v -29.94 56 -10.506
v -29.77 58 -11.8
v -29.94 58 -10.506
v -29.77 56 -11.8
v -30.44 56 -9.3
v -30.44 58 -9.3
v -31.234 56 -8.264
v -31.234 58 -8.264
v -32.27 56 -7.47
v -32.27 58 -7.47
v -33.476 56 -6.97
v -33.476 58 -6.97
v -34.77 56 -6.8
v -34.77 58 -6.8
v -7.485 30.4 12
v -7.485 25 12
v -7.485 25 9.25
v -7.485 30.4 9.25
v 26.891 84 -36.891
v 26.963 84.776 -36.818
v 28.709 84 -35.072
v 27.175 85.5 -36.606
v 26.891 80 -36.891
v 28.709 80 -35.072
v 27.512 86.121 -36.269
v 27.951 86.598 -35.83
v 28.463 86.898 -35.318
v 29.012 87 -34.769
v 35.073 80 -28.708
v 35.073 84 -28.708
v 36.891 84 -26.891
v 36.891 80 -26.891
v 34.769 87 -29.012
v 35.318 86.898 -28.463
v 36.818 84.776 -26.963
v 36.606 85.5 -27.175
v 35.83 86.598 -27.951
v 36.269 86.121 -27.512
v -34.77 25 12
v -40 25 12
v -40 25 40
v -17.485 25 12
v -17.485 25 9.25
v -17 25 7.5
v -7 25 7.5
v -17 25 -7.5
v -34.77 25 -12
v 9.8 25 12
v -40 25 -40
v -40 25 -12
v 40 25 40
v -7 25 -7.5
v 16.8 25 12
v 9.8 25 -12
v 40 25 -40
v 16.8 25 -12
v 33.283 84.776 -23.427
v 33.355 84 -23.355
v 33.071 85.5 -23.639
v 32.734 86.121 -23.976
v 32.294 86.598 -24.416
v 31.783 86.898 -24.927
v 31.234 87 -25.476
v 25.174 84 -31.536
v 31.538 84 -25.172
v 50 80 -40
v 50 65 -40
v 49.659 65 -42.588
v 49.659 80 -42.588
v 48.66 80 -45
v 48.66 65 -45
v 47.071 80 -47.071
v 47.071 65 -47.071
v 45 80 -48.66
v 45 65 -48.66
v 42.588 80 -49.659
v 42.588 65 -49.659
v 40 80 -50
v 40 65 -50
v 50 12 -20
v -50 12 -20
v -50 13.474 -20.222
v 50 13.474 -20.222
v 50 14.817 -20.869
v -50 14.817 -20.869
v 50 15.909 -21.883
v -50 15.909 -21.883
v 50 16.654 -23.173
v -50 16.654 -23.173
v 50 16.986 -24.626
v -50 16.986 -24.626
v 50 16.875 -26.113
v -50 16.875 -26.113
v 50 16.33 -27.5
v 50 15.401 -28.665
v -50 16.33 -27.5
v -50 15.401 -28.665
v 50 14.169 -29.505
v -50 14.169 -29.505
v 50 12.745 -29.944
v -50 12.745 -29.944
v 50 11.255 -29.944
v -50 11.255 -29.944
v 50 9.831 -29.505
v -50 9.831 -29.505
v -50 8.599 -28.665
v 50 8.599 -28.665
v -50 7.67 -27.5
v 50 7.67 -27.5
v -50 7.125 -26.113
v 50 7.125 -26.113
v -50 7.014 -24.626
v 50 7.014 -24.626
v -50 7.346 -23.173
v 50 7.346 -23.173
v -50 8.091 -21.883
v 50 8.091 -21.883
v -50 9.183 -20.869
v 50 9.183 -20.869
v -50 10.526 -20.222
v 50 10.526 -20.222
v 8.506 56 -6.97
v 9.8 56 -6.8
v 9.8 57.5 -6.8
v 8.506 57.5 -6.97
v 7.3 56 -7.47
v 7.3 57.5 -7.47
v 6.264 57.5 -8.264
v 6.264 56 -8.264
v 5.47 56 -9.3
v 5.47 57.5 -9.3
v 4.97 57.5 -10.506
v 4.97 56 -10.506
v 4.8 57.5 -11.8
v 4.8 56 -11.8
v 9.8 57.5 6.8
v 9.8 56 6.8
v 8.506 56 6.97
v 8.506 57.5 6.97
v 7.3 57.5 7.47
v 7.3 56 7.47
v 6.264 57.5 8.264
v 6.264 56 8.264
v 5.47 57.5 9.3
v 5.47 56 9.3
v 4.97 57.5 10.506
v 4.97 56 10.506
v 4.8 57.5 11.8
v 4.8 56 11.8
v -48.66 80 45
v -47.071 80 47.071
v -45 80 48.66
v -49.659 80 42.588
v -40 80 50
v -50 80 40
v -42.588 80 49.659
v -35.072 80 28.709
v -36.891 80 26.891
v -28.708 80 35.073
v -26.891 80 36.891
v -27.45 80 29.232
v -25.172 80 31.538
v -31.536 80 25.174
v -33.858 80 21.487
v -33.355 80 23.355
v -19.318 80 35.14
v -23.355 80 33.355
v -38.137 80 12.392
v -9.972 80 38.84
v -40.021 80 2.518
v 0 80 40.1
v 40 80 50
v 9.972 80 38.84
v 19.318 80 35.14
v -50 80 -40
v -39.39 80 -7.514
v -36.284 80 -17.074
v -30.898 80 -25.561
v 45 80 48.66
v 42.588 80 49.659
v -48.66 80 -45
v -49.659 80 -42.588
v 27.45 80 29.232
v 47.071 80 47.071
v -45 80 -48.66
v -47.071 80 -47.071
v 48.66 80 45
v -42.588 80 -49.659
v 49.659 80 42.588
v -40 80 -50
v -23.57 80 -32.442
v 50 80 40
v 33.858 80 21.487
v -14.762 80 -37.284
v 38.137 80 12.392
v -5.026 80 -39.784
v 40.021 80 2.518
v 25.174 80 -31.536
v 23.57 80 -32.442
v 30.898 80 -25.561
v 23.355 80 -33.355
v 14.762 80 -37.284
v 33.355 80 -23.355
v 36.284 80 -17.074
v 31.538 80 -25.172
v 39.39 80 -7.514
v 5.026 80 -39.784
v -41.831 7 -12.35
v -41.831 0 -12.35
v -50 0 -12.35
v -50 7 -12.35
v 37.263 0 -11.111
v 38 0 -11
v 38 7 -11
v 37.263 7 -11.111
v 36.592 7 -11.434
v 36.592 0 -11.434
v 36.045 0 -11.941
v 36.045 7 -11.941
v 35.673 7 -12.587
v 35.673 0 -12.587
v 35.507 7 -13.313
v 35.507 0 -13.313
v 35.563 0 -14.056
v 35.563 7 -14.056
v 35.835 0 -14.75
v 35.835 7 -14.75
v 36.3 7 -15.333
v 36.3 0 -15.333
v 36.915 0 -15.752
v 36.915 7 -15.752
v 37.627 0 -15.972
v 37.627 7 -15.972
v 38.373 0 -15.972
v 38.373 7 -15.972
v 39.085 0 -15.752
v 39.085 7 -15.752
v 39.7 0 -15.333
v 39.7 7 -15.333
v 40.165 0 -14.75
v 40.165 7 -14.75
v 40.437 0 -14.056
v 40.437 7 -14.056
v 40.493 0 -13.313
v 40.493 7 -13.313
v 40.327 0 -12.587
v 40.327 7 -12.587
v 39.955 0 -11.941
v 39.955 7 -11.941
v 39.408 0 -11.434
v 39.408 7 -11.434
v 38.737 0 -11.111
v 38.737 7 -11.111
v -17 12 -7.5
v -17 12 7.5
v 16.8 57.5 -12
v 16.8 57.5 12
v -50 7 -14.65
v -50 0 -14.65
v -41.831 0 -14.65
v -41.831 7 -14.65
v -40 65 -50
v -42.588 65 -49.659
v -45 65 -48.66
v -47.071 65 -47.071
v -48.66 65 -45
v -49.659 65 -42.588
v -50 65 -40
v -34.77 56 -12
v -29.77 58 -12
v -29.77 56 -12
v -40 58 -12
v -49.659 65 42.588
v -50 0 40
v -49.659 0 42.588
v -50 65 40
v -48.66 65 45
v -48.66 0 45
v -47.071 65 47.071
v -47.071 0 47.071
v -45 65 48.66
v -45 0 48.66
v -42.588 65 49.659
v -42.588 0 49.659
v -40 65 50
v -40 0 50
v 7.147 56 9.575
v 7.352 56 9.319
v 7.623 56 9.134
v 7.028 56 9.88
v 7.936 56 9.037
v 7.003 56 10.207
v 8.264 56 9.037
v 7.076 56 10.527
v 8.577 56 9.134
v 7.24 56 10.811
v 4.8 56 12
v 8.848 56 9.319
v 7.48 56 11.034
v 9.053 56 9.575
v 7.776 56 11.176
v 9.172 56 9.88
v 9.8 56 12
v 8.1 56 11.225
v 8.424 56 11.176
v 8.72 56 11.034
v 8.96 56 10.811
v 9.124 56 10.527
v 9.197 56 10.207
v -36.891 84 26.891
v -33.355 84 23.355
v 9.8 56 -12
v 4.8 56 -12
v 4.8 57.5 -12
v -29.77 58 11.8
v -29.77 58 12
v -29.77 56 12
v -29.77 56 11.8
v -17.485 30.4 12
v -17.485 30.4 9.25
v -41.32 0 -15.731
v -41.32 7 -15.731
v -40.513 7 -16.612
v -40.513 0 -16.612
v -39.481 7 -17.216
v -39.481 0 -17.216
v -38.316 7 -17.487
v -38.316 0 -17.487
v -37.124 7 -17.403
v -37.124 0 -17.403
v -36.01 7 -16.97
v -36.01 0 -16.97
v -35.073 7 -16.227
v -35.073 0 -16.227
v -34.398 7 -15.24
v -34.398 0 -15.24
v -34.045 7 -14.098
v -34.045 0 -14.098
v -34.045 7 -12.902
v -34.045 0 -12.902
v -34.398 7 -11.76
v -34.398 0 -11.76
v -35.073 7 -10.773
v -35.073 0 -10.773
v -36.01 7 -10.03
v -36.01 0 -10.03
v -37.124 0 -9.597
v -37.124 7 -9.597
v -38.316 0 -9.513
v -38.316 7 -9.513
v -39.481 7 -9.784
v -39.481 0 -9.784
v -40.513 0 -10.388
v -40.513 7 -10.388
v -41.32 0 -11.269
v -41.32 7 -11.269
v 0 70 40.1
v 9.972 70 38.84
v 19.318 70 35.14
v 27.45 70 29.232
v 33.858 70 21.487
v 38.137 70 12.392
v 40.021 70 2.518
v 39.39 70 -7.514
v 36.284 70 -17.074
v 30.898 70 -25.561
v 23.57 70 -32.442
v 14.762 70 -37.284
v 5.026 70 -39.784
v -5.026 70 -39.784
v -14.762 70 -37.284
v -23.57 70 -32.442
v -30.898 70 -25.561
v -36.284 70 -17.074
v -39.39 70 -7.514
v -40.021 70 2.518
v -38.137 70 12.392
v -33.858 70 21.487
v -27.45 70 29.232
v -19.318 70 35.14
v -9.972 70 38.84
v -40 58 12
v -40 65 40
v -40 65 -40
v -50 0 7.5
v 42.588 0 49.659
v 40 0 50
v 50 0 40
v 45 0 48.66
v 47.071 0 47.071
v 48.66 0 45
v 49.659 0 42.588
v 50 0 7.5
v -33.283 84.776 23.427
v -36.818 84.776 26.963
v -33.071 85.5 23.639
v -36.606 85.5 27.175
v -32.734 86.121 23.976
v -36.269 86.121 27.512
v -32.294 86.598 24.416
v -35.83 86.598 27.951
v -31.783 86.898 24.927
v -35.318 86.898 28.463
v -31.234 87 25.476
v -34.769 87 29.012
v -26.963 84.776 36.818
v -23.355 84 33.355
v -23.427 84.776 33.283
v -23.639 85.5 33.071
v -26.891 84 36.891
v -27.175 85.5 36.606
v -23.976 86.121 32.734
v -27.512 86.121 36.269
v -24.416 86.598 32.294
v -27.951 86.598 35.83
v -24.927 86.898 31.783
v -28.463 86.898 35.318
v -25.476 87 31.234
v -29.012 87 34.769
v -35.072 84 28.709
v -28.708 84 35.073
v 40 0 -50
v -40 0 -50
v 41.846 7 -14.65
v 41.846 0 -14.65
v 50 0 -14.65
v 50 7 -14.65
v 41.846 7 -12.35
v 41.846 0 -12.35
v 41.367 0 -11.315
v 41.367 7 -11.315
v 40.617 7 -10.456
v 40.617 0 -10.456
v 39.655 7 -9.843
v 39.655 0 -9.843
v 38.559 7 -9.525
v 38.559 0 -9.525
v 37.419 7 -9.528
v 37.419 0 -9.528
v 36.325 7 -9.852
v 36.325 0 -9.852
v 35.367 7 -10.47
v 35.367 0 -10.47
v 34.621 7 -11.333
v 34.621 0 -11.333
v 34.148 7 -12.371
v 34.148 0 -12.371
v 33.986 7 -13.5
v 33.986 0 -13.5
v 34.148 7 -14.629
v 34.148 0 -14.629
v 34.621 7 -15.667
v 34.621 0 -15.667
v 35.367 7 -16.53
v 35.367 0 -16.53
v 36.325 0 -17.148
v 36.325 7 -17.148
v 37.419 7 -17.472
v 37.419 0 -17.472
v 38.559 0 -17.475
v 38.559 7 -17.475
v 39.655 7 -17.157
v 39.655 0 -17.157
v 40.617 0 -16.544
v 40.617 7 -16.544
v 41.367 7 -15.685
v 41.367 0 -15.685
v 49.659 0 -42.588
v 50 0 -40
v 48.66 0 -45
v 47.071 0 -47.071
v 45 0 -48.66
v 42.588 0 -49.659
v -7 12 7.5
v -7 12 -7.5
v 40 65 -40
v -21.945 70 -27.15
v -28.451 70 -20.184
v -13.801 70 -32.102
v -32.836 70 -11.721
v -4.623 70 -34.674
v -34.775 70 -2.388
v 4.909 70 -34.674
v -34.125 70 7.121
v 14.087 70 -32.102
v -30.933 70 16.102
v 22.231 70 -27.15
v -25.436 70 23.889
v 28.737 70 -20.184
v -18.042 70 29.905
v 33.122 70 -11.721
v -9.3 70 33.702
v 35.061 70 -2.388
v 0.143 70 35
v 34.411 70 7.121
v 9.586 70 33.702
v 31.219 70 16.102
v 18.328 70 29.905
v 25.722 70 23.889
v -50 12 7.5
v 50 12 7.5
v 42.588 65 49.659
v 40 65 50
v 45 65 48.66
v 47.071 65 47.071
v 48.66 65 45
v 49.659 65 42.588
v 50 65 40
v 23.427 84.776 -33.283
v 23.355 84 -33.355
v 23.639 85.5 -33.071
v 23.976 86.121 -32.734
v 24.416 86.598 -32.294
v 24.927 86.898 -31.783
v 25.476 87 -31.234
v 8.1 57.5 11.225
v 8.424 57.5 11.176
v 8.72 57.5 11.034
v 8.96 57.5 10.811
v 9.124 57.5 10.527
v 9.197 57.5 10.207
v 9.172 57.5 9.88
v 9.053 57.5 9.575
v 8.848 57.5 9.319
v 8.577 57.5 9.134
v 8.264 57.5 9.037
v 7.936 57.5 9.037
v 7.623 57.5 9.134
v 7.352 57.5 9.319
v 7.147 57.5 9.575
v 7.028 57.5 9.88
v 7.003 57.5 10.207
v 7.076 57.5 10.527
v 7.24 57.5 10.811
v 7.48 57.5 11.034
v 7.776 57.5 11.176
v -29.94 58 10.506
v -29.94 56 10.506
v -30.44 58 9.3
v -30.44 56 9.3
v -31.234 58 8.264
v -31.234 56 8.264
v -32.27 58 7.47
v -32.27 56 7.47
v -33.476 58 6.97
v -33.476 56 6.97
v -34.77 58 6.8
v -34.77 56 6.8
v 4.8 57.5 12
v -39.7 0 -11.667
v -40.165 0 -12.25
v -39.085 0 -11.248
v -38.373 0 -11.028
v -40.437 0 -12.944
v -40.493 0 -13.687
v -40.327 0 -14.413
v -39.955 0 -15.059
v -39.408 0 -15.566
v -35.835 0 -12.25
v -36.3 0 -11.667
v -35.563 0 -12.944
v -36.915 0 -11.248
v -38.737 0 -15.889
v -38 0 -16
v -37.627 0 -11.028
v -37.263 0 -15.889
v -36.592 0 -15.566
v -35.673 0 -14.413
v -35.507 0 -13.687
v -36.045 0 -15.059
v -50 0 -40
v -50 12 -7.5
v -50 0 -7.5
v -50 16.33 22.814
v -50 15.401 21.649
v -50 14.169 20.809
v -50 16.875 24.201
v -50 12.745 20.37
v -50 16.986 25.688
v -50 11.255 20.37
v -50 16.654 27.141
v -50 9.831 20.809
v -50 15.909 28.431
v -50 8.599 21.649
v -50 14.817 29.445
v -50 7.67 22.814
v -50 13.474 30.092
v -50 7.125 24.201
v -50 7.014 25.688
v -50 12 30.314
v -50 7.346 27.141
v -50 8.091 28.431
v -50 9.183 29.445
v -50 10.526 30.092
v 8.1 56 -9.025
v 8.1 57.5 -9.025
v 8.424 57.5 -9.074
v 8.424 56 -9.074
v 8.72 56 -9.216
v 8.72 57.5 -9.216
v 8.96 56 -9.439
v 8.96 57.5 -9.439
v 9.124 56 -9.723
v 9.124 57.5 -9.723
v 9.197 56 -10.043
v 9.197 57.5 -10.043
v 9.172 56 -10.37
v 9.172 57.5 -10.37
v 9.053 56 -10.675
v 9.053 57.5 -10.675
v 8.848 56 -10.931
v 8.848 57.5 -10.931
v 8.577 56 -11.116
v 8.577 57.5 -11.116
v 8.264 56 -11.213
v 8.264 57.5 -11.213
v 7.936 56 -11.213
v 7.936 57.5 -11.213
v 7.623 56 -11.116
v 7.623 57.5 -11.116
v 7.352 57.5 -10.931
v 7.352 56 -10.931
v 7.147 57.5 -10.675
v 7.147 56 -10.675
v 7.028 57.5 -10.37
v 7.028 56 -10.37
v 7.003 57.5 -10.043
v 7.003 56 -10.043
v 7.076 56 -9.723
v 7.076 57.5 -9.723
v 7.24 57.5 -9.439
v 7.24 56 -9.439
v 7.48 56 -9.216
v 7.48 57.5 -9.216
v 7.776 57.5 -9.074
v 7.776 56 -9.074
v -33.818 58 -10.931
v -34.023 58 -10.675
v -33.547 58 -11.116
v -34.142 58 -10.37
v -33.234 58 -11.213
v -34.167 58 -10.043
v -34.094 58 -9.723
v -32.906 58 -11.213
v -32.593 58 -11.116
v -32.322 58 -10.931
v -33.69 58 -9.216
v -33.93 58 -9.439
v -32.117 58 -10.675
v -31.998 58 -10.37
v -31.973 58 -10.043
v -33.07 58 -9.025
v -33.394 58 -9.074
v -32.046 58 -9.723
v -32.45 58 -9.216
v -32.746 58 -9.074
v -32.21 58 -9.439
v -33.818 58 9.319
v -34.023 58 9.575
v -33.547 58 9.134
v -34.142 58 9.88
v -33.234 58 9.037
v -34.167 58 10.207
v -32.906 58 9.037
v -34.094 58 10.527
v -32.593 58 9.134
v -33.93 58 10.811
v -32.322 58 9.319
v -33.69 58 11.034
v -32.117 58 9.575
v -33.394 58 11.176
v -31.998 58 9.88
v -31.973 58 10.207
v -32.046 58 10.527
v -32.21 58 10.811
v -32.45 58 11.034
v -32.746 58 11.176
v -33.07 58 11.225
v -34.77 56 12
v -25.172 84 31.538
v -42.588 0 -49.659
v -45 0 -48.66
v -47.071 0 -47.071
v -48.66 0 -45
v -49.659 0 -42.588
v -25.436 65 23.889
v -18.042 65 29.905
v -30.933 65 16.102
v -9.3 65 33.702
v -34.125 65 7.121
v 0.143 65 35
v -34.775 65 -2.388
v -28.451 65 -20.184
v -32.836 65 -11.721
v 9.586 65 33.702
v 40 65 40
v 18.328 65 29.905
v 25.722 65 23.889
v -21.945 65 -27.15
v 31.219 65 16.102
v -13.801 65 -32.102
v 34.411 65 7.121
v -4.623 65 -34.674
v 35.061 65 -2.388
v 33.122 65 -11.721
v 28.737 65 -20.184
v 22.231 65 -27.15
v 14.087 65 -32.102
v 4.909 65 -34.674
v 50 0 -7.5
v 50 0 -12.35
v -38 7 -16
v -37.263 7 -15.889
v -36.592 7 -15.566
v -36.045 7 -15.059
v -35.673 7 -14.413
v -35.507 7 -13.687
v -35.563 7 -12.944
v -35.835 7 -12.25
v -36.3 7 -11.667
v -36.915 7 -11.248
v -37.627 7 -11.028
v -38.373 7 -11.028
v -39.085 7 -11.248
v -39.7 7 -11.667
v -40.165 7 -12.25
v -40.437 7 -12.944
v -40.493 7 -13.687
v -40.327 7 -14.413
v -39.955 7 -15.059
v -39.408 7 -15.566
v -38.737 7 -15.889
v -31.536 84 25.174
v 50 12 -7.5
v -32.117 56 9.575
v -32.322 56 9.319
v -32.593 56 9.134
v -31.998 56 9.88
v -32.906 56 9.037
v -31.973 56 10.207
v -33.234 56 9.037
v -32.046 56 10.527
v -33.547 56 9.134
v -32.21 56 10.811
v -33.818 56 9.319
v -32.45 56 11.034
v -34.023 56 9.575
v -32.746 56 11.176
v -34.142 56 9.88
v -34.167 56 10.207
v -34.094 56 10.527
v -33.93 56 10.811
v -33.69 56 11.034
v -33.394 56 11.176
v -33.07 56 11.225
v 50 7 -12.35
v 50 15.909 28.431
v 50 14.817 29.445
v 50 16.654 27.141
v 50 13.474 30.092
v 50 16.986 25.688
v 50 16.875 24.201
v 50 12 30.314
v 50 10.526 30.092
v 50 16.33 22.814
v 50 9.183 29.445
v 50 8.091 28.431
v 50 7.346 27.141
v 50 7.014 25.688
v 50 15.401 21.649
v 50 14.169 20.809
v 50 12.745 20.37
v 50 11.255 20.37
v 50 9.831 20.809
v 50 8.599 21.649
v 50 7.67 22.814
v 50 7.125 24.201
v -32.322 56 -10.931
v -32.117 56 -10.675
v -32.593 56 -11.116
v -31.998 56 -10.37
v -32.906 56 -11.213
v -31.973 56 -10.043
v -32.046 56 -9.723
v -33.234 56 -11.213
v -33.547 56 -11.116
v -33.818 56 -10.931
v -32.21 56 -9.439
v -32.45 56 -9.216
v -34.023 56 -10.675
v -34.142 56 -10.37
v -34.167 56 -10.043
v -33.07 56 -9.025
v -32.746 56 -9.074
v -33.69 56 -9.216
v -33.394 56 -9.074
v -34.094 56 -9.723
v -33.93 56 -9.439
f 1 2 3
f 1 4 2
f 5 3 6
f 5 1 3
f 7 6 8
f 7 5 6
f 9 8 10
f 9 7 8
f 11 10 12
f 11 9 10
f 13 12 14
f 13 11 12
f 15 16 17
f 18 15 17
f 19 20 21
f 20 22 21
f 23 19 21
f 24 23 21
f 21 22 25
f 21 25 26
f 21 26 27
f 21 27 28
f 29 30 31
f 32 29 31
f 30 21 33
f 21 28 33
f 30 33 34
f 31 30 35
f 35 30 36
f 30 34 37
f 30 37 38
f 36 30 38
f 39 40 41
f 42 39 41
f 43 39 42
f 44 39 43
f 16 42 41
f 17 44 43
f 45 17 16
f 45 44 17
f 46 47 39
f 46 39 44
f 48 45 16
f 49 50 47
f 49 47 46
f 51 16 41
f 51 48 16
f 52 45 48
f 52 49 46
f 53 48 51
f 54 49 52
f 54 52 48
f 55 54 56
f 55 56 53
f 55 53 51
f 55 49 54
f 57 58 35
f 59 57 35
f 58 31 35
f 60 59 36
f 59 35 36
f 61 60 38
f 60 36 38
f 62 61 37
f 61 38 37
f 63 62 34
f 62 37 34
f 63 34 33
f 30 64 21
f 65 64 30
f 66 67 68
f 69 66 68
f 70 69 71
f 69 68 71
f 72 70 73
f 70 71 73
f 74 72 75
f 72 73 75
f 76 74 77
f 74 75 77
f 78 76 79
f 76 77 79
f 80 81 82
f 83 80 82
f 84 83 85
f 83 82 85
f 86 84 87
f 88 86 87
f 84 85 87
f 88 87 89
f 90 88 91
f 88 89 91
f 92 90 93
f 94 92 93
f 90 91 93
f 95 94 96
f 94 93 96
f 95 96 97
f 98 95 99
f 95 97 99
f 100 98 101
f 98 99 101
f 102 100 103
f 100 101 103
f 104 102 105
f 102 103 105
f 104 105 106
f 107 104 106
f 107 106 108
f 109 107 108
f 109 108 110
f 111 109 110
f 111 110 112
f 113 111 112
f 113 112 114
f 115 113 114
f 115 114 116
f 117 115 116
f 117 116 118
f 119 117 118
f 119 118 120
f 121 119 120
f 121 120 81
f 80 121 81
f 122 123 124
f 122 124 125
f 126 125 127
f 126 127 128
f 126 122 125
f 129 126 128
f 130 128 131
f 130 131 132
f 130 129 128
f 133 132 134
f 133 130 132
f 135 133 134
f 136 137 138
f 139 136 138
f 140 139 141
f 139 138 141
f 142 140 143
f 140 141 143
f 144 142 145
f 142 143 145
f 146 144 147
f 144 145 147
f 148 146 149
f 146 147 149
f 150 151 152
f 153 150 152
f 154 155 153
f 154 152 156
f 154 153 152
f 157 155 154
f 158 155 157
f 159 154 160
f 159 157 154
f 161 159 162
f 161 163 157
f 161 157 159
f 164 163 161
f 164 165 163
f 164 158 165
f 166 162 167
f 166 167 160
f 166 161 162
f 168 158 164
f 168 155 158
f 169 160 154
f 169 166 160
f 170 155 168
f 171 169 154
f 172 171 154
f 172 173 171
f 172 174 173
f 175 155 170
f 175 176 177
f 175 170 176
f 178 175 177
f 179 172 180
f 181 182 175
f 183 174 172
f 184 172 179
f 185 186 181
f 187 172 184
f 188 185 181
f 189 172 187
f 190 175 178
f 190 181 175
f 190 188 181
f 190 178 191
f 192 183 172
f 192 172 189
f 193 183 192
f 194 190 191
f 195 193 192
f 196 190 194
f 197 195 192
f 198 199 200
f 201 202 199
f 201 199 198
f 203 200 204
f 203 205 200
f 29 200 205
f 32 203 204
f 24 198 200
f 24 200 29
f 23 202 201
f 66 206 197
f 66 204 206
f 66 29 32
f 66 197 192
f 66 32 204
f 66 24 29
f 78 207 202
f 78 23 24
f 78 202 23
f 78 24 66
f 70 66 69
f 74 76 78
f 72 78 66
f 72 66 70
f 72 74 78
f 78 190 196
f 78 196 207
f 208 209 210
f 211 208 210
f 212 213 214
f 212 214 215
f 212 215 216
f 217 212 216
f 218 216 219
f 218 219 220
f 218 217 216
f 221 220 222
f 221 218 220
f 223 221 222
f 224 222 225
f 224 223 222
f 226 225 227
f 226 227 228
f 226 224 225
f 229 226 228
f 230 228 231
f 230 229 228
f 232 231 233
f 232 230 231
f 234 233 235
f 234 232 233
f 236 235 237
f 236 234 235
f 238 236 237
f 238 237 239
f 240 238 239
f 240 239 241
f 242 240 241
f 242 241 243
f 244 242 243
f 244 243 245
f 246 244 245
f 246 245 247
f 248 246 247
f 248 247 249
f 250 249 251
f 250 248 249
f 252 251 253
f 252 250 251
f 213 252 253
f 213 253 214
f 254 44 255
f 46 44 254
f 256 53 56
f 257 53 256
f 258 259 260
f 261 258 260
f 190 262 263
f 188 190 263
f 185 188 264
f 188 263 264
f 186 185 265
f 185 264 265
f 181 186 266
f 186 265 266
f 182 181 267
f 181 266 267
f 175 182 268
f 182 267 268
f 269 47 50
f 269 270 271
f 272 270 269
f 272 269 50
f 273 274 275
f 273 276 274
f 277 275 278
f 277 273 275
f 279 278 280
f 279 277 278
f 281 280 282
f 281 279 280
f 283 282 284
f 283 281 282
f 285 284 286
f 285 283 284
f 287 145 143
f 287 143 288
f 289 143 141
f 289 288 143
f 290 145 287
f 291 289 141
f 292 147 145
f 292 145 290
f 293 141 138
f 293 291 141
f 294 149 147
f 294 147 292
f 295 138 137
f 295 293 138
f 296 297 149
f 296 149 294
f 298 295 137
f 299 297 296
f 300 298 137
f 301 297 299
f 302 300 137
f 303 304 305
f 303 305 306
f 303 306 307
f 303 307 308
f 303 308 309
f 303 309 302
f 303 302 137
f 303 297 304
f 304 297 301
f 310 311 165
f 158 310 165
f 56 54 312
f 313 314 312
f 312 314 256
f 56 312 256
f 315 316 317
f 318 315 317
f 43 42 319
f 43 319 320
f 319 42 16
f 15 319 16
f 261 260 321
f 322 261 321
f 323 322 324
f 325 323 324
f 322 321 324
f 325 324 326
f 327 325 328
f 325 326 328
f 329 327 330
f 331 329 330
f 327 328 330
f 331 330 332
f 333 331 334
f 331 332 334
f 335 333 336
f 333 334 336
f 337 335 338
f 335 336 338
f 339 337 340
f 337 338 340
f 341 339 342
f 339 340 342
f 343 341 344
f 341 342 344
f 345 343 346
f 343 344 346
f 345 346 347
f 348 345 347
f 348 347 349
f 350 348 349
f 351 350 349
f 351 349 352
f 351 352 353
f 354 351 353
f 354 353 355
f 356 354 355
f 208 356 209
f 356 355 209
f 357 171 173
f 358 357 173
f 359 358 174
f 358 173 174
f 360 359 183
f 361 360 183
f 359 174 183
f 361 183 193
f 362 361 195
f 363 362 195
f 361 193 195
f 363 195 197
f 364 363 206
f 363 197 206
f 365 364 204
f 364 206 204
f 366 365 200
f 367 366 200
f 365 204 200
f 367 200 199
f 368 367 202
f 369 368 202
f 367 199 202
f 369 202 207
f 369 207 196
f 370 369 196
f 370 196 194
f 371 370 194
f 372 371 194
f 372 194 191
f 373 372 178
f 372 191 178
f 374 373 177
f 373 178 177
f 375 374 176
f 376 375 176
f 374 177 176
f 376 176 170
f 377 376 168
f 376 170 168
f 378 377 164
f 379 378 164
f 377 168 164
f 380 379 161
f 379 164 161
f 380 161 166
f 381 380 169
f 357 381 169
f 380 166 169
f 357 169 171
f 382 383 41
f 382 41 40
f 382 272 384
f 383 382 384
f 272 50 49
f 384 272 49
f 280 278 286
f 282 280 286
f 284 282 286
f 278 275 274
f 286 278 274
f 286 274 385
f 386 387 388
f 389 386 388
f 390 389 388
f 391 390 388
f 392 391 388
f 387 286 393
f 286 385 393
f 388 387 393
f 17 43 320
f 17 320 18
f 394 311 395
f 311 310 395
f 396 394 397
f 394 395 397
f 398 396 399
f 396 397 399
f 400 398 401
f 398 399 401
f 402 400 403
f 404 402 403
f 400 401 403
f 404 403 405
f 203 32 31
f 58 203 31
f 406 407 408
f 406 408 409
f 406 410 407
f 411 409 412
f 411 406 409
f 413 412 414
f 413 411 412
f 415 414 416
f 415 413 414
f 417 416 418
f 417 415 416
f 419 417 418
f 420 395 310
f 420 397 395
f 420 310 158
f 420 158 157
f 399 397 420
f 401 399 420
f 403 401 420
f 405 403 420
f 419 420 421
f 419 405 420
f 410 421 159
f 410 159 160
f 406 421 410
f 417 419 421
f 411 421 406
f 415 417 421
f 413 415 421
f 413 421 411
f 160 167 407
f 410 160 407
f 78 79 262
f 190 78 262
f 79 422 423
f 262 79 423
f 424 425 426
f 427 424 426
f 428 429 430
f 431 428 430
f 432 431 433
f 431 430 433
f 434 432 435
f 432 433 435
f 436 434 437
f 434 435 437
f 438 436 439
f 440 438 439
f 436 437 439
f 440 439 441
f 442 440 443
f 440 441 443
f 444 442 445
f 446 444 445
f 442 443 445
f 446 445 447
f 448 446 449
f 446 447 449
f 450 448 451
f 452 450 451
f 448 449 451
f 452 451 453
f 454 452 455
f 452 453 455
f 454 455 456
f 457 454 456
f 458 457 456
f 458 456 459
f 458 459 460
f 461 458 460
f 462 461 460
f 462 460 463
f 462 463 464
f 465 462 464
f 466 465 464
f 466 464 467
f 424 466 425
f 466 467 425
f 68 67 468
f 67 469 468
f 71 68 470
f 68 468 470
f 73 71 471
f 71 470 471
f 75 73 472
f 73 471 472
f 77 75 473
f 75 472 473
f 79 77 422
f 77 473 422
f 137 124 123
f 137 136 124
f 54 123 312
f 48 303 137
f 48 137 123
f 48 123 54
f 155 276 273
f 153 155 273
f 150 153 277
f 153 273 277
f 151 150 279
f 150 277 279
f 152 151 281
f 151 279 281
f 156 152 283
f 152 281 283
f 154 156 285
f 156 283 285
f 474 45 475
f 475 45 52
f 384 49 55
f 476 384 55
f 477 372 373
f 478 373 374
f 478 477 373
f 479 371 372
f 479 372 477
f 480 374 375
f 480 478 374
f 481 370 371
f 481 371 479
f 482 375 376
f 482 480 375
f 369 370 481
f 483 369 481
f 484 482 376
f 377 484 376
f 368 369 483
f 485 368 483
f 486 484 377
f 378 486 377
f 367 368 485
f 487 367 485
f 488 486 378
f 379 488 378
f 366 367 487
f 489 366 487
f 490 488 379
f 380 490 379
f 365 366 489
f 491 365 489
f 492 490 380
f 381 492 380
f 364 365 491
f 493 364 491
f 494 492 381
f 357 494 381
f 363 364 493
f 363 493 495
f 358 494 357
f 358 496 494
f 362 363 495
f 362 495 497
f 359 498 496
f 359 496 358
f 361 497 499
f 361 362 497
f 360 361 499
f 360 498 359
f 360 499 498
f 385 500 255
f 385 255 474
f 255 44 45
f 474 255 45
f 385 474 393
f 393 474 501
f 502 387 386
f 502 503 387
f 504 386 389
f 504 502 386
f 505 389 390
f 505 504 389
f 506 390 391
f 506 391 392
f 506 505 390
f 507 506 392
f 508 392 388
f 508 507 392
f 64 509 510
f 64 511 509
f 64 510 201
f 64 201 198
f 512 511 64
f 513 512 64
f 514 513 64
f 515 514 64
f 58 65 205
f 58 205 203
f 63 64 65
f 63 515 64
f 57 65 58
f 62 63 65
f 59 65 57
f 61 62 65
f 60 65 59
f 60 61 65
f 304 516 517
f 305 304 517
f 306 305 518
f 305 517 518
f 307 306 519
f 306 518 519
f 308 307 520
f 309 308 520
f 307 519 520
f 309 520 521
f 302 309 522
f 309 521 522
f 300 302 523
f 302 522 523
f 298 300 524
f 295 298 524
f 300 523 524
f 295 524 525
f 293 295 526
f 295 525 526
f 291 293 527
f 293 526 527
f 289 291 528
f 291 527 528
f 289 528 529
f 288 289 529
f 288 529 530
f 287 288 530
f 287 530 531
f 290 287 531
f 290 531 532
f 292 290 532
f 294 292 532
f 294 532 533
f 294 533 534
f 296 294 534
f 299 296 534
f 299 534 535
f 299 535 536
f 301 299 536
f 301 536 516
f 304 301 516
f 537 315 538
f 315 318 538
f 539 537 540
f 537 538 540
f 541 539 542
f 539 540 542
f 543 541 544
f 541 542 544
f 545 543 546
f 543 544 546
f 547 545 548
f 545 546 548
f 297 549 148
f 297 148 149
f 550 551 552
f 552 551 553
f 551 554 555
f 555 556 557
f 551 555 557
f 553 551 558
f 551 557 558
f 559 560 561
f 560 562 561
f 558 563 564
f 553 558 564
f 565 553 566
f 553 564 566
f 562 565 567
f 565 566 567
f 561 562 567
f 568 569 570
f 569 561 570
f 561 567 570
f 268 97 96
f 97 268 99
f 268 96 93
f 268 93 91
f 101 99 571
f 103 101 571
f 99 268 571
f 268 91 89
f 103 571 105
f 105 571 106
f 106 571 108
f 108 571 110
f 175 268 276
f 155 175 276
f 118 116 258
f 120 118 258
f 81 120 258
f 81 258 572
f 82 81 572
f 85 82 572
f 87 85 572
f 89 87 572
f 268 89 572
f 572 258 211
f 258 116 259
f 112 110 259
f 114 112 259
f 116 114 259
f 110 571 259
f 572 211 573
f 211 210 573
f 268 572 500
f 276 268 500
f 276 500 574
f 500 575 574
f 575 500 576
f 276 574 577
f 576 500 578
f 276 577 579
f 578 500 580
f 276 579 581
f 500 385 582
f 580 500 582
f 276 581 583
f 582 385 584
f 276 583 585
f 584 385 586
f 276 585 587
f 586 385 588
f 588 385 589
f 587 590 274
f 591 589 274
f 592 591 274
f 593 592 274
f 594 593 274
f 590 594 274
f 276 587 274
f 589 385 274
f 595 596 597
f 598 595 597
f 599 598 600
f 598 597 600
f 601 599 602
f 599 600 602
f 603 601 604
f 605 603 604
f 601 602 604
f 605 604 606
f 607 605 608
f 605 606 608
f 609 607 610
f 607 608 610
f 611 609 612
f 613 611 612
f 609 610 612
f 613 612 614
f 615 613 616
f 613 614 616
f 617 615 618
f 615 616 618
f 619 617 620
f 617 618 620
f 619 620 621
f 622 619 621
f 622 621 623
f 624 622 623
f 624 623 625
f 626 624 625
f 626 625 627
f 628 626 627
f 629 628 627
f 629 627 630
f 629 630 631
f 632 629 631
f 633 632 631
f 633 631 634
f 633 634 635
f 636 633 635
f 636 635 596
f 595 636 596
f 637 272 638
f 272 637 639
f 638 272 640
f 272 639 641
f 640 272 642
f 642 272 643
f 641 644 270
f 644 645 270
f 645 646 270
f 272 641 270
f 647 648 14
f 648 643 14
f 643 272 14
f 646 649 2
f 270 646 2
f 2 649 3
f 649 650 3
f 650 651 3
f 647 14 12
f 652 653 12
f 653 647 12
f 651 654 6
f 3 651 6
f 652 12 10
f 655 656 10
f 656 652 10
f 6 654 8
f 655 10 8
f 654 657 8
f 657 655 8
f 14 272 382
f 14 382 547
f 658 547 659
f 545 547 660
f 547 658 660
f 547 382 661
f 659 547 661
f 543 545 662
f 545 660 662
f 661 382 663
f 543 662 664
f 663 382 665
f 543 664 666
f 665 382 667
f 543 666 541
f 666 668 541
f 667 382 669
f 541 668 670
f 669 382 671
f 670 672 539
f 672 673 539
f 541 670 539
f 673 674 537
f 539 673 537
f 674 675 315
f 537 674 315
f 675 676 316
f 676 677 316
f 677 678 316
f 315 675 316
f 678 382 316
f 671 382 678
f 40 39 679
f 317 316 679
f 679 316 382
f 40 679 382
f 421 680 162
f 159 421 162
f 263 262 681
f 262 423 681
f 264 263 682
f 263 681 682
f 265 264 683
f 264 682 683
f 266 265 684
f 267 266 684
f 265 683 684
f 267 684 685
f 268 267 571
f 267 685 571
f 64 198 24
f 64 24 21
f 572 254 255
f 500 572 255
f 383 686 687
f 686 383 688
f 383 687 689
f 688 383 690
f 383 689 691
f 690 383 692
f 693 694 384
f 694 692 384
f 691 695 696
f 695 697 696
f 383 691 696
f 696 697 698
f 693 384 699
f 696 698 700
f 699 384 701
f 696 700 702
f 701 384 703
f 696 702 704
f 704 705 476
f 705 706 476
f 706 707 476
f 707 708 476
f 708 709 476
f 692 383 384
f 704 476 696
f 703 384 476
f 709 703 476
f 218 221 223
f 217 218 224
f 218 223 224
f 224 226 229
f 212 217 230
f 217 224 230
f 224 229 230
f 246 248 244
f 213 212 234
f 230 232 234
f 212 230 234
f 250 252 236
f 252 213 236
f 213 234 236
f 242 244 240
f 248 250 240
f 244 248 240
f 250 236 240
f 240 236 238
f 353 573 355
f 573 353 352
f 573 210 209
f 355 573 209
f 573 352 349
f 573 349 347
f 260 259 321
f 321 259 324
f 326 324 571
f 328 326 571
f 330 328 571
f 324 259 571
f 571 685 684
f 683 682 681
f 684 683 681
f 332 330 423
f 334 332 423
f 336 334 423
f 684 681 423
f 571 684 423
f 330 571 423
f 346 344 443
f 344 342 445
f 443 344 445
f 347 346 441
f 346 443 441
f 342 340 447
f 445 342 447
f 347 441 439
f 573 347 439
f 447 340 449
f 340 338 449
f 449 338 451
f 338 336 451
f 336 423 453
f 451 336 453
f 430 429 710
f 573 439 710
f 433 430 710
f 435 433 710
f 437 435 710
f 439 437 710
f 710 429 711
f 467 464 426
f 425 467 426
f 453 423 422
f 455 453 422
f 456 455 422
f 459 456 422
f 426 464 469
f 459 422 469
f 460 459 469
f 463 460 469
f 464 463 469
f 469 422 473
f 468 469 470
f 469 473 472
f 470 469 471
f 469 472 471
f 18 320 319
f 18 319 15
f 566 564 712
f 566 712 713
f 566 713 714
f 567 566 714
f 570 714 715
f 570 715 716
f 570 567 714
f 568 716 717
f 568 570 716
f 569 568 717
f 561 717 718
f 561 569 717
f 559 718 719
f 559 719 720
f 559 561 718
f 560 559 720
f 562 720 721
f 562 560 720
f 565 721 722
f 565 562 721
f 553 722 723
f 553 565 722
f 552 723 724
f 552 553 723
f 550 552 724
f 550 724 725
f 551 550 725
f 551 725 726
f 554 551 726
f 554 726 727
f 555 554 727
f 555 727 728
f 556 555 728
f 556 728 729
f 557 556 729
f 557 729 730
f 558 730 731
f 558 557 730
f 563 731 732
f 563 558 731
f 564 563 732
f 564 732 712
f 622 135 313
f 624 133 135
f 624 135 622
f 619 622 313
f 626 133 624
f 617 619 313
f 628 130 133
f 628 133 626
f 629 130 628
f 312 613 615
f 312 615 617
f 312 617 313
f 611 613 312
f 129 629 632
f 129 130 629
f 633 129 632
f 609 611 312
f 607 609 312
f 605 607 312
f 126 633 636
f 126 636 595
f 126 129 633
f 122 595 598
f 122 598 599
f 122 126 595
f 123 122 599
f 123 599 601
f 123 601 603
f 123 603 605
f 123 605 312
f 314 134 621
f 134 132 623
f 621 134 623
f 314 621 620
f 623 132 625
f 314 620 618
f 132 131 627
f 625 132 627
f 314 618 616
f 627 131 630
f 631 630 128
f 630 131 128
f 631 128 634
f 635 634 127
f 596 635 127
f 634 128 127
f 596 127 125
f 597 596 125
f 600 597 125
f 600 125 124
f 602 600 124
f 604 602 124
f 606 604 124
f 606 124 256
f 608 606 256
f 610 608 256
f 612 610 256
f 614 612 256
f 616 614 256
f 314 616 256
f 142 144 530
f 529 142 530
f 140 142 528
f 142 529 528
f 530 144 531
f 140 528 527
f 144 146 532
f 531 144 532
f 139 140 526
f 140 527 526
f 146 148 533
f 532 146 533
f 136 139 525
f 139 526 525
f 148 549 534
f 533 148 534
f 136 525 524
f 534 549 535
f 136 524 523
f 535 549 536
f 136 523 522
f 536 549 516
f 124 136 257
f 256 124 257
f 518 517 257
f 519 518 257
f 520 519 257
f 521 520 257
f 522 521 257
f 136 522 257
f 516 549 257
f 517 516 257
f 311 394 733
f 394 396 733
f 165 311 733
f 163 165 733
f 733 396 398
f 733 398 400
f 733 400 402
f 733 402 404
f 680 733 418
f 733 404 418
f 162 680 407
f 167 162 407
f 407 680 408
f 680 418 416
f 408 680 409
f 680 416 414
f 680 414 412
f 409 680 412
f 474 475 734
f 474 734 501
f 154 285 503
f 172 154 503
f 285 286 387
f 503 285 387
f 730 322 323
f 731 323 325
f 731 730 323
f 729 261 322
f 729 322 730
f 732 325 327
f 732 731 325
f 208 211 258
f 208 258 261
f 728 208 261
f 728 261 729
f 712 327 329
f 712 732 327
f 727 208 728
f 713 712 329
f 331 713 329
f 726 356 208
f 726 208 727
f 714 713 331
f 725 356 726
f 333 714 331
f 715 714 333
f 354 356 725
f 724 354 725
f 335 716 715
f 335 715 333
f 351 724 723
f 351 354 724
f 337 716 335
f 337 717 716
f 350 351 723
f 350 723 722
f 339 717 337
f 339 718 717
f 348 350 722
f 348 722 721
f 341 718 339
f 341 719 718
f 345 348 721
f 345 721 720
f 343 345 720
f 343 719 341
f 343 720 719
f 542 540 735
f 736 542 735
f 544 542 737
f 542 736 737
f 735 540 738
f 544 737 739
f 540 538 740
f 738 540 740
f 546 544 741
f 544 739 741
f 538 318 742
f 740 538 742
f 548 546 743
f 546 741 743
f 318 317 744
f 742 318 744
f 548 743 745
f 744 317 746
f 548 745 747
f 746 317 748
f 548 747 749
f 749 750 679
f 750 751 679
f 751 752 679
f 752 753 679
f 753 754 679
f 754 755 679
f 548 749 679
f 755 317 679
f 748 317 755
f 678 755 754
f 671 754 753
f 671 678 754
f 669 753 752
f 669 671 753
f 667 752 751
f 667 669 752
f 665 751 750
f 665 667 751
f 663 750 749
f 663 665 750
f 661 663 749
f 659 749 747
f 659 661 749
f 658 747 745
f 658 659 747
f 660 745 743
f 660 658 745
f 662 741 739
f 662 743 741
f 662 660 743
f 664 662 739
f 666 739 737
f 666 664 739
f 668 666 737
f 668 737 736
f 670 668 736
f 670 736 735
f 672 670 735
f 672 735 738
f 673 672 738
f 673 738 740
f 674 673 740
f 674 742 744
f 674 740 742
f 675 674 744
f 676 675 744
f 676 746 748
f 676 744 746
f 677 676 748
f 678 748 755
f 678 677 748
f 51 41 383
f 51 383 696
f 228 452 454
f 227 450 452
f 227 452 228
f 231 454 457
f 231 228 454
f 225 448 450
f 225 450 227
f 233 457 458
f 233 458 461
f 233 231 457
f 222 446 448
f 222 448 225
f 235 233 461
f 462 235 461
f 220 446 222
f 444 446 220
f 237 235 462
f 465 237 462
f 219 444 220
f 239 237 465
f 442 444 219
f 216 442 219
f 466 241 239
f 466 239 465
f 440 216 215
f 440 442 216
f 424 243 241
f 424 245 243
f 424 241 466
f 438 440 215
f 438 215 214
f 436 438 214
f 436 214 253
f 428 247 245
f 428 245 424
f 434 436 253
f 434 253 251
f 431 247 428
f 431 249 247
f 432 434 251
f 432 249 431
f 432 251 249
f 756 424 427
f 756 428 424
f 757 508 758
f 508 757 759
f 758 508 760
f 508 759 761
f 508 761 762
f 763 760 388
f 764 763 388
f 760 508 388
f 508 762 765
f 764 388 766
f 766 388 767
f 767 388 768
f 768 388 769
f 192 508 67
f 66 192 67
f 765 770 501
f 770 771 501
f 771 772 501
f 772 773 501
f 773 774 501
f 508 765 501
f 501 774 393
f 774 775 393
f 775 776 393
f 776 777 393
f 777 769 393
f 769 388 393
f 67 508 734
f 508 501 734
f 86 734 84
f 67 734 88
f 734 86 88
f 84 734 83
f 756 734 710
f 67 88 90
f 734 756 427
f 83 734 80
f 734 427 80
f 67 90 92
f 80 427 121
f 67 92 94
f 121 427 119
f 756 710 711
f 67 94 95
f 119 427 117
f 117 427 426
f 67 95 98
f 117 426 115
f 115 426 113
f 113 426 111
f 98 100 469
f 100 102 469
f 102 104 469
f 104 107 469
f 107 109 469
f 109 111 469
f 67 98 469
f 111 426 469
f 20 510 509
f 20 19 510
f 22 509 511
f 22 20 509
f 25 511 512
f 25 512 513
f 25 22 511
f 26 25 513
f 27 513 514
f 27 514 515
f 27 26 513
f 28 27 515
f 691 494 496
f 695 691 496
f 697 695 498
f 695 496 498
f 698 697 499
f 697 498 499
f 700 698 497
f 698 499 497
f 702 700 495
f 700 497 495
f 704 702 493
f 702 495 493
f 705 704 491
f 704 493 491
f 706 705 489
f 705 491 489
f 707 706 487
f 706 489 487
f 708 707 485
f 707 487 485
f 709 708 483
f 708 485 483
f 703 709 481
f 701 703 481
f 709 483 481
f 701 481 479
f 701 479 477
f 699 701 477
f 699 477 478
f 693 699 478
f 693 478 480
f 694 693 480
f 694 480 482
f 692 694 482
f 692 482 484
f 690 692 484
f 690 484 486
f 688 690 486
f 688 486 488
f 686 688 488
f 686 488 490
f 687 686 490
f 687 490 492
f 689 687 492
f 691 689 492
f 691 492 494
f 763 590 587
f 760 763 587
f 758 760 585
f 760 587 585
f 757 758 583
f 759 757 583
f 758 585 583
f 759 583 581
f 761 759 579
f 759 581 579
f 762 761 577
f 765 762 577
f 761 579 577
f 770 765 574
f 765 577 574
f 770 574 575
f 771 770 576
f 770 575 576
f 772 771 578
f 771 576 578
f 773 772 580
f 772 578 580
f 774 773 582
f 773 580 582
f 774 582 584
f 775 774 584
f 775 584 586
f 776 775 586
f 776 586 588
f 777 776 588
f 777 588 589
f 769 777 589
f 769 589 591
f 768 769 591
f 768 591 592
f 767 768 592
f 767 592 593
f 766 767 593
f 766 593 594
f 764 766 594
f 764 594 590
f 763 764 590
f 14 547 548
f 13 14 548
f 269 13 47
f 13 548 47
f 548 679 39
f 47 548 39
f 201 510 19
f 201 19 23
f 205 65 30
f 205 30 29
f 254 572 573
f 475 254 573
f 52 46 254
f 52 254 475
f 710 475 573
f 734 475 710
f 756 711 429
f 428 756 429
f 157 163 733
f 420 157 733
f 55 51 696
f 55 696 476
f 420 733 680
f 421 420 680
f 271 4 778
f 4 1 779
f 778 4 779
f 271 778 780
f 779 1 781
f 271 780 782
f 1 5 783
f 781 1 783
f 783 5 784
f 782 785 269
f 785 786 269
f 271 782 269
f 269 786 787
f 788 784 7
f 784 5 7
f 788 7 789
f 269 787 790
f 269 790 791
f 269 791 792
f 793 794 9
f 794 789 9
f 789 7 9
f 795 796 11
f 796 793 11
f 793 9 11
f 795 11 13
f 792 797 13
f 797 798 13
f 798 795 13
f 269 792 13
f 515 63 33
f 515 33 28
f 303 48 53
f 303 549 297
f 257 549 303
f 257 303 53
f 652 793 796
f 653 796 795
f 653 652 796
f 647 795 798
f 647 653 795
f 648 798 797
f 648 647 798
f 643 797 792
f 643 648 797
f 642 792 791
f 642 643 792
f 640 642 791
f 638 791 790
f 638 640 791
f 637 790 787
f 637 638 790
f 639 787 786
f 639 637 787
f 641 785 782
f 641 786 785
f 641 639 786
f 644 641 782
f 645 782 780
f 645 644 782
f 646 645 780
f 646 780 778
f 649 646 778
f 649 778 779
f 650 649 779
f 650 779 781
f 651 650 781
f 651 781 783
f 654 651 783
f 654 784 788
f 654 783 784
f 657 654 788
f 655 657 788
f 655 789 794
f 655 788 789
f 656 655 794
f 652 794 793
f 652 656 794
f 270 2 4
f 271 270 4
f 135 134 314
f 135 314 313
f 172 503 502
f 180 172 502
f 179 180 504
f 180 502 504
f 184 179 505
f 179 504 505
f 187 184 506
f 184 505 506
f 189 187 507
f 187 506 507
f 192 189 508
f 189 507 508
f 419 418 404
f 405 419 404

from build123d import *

# Parameters (mm, degrees)
SKETCH1_W            = 100
SKETCH1_H            = 100
BOSS_EXTRUDE1_DEPTH  = 25
SKETCH2_W            = 100
SKETCH2_H            = 100
SKETCH2_W_2          = 80
SKETCH2_H_2          = 80
BOSS_EXTRUDE2_DEPTH  = 40
SKETCH3_R            = 5
SKETCH3_W            = 15
SKETCH3_H            = 12
CUT_EXTRUDE1_DEPTH   = 130.325171564
FILLET2_R            = 10
FILLET3_R            = 10
FILLET4_R            = 10
FILLET5_R            = 10
BOSS_EXTRUDE3_DEPTH  = 15
SKETCH6_R            = 35
CUT_EXTRUDE3_DEPTH   = 25
SKETCH7_R            = 40.1
CUT_EXTRUDE4_DEPTH   = 10
BOSS_EXTRUDE4_DEPTH  = 12
SKETCH10_R           = 1.1
SKETCH10_W           = 5
SKETCH10_H           = 13.6
CUT_EXTRUDE5_DEPTH   = 10
FILLET6_R            = 5
SKETCH11_W           = 12
SKETCH11_H           = 0.5
CUT_EXTRUDE6_DEPTH   = 24
SKETCH12_W           = 10
SKETCH12_H           = 15
CUT_EXTRUDE7_DEPTH   = 24
SKETCH15_W           = 10
SKETCH15_H           = 2.75
BOSS_EXTRUDE5_DEPTH  = 5.4
SKETCH18_R           = 2.5
CUT_EXTRUDE8_DEPTH   = 7
BOSS_EXTRUDE6_DEPTH  = 5
FILLET8_R            = 3
FILLET8_OF_MIRROR3_R = 3


with BuildPart() as part:
    # Sketch1 → Boss-Extrude1 (new body)
    with BuildSketch(Plane(origin=(0, 0, 0), x_dir=(1, 0, 0), z_dir=(0, 1, 0))):
        Rectangle(SKETCH1_W, SKETCH1_H)
    extrude(amount=BOSS_EXTRUDE1_DEPTH)

    # Sketch2 → Boss-Extrude2 (add)
    with BuildSketch(Plane(origin=(0, 25, 0), x_dir=(1, 0, 0), z_dir=(0, 1, 0))):
        Rectangle(SKETCH2_W, SKETCH2_H)
        Rectangle(SKETCH2_W_2, SKETCH2_H_2, mode=Mode.SUBTRACT)
    extrude(amount=BOSS_EXTRUDE2_DEPTH)

    # Sketch3 → Cut-Extrude1 (cut, through all)
    with BuildSketch(Plane.ZY.offset(50)):
        with Locations((-25, 12)):
            Circle(SKETCH3_R)
        with Locations((25.313920598, 12)):
            Circle(SKETCH3_R)
        with Locations((0, 6)):
            Rectangle(SKETCH3_W, SKETCH3_H)
    extrude(amount=-CUT_EXTRUDE1_DEPTH, mode=Mode.SUBTRACT)

    # Fillet2
    fillet2_edges = [part.edges().sort_by_distance(p)[0] for p in [
        (50, 32.5, 50),
    ]]
    fillet(fillet2_edges, radius=FILLET2_R)

    # Fillet3
    fillet3_edges = [part.edges().sort_by_distance(p)[0] for p in [
        (50, 32.5, -50),
    ]]
    fillet(fillet3_edges, radius=FILLET3_R)

    # Fillet4
    fillet4_edges = [part.edges().sort_by_distance(p)[0] for p in [
        (-50, 32.5, -50),
    ]]
    fillet(fillet4_edges, radius=FILLET4_R)

    # Fillet5
    fillet5_edges = [part.edges().sort_by_distance(p)[0] for p in [
        (-50, 32.5, 50),
    ]]
    fillet(fillet5_edges, radius=FILLET5_R)

    # Sketch5 → Boss-Extrude3 (add)
    with BuildSketch(Plane(origin=(0, 65, 0), x_dir=(1, 0, 0), z_dir=(0, 1, 0))):
        with BuildLine():
            Line((-50, 40), (-50, -40))
            ThreePointArc((-50, -40), (-47.071067812, -47.071067812), (-40, -50))
            Line((-40, -50), (40, -50))
            ThreePointArc((40, -50), (47.071067812, -47.071067812), (50, -40))
            Line((50, -40), (50, 40))
            ThreePointArc((50, 40), (47.071067812, 47.071067812), (40, 50))
            Line((40, 50), (-40, 50))
            ThreePointArc((-40, 50), (-47.071067812, 47.071067812), (-50, 40))
        make_face()
    extrude(amount=BOSS_EXTRUDE3_DEPTH)

    # Sketch6 → Cut-Extrude3 (cut)
    with BuildSketch(Plane(origin=(0, 80, 0), x_dir=(1, 0, 0), z_dir=(0, 1, 0))):
        with Locations(Location((0.142992369, 0, 0), (0, 0, 270))):
            Circle(SKETCH6_R)
    extrude(amount=-CUT_EXTRUDE3_DEPTH, mode=Mode.SUBTRACT)

    # Sketch7 → Cut-Extrude4 (cut)
    with BuildSketch(Plane(origin=(0, 80, 0), x_dir=(1, 0, 0), z_dir=(0, 1, 0))):
        with Locations(Location((0, 0, 0), (0, 0, 270))):
            Circle(SKETCH7_R)
    extrude(amount=-CUT_EXTRUDE4_DEPTH, mode=Mode.SUBTRACT)

    # Sketch9 → Boss-Extrude4 (add, symmetric)
    with BuildSketch(Plane.XY):
        Polygon((9.8, 56), (9.8, 25), (16.8, 25), (16.8, 58), (4.8, 58), (4.8, 56), align=None)
    boss_extrude4 = extrude(amount=BOSS_EXTRUDE4_DEPTH, both=True)

    # Mirror1: Boss-Extrude4 across plane
    add(boss_extrude4.mirror(Plane.ZY.offset(12.485)))

    # Sketch10 → Cut-Extrude5 (cut)
    with BuildSketch(Plane(origin=(0, 58, 0), x_dir=(1, 0, 0), z_dir=(0, 1, 0))):
        with Locations(Location((8.1, -10.125, 0), (0, 0, 270))):
            Circle(SKETCH10_R)
        with Locations(Location((8.1, 10.125, 0), (0, 0, 270))):
            Circle(SKETCH10_R)
        with Locations((7.3, 0)):
            Rectangle(SKETCH10_W, SKETCH10_H)
    cut_extrude5 = extrude(amount=-CUT_EXTRUDE5_DEPTH, mode=Mode.SUBTRACT)

    # Mirror2: Cut-Extrude5 across plane
    add(cut_extrude5.mirror(Plane.ZY.offset(12.485)), mode=Mode.SUBTRACT)

    # Fillet6
    fillet6_edges = [part.edges().sort_by_distance(p)[0] for p in [
        (-29.77, 57, 6.8),
        (-29.77, 57, -6.8),
        (4.8, 57, 6.8),
        (4.8, 57, -6.8),
    ]]
    fillet(fillet6_edges, radius=FILLET6_R - 0.0001)  # a hair under: the kernel refuses the full size

    # Sketch11 → Cut-Extrude6 (cut)
    with BuildSketch(Plane.XY.offset(12)):
        with Locations((10.8, 57.75)):
            Rectangle(SKETCH11_W, SKETCH11_H)
    extrude(amount=-CUT_EXTRUDE6_DEPTH, mode=Mode.SUBTRACT)

    # Sketch12 → Cut-Extrude7 (cut)
    with BuildSketch(Plane(origin=(0, 25, 0), x_dir=(1, 0, 0), z_dir=(0, 1, 0))):
        with Locations((-12, 0)):
            Rectangle(SKETCH12_W, SKETCH12_H)
    extrude(amount=-CUT_EXTRUDE7_DEPTH, mode=Mode.SUBTRACT)

    # Sketch15 → Boss-Extrude5 (add)
    with BuildSketch(Plane(origin=(0, 25, 0), x_dir=(1, 0, 0), z_dir=(0, 1, 0))):
        with Locations((-12.485, -10.625)):
            Rectangle(SKETCH15_W, SKETCH15_H)
    extrude(amount=BOSS_EXTRUDE5_DEPTH)

    # Sketch18 → Cut-Extrude8 (cut)
    # profile 1 of 2: a face of its own
    with BuildSketch(Plane.XZ):
        with BuildLine():
            Line((-50, -12.35), (-50, -14.65))
            Line((-50, -14.65), (-41.831122551, -14.65))
            ThreePointArc((-41.831122551, -14.65), (-34, -13.5), (-41.831122551, -12.35))
            Line((-41.831122551, -12.35), (-50, -12.35))
        make_face()
        with Locations(Location((-38, -13.5, 0), (0, 0, 270))):
            Circle(SKETCH18_R, mode=Mode.SUBTRACT)
    # profile 2 of 2: a face of its own
    with BuildSketch(Plane.XZ):
        with BuildLine():
            Line((41.845776905, -14.65), (50, -14.65))
            Line((50, -14.65), (50, -12.35))
            Line((50, -12.35), (41.845776905, -12.35))
            ThreePointArc((41.845776905, -12.35), (33.985962133, -13.5), (41.845776905, -14.65))
        make_face()
        with Locations(Location((38, -13.5, 0), (0, 0, 90))):
            Circle(SKETCH18_R, mode=Mode.SUBTRACT)
    extrude(amount=-CUT_EXTRUDE8_DEPTH, mode=Mode.SUBTRACT)

    # Sketch20 → Boss-Extrude6 (add)
    with BuildSketch(Plane(origin=(-28.354981926, 0, 28.354981926), x_dir=(0.7071067811865476, 0, 0.7071067811865475), z_dir=(-0.7071067811865475, 0, 0.7071067811865476))):
        Polygon((-4.498932188, 80), (-4.498932188, 84), (4.501067812, 84), (4.501067812, 80), (7.071067812, 80), (7.071067812, 87), (-7.071067812, 87), (-7.071067812, 80), align=None)
    boss_extrude6 = extrude(amount=BOSS_EXTRUDE6_DEPTH)

    # Fillet8
    fillet8_edges = [part.edges().sort_by_distance(p)[0] for p in [
        (-35.122748879, 87, 25.122748879),
        (-25.122748879, 87, 35.122748879),
    ]]
    fillet(fillet8_edges, radius=FILLET8_R)

    # Mirror3: Boss-Extrude6 across plane
    add(boss_extrude6.mirror(Plane(origin=(0, 0, 0), x_dir=(0.7071067811865476, 0, 0.7071067811865475), z_dir=(-0.7071067811865475, 0, 0.7071067811865476))))

    # Fillet8 of Mirror3
    fillet8_of_mirror3_edges = [part.edges().sort_by_distance(p)[0] for p in [
        (25.122748879, 87, -35.122748879),
        (35.122748879, 87, -25.122748879),
    ]]
    fillet(fillet8_of_mirror3_edges, radius=FILLET8_OF_MIRROR3_R)


solid = part.part
